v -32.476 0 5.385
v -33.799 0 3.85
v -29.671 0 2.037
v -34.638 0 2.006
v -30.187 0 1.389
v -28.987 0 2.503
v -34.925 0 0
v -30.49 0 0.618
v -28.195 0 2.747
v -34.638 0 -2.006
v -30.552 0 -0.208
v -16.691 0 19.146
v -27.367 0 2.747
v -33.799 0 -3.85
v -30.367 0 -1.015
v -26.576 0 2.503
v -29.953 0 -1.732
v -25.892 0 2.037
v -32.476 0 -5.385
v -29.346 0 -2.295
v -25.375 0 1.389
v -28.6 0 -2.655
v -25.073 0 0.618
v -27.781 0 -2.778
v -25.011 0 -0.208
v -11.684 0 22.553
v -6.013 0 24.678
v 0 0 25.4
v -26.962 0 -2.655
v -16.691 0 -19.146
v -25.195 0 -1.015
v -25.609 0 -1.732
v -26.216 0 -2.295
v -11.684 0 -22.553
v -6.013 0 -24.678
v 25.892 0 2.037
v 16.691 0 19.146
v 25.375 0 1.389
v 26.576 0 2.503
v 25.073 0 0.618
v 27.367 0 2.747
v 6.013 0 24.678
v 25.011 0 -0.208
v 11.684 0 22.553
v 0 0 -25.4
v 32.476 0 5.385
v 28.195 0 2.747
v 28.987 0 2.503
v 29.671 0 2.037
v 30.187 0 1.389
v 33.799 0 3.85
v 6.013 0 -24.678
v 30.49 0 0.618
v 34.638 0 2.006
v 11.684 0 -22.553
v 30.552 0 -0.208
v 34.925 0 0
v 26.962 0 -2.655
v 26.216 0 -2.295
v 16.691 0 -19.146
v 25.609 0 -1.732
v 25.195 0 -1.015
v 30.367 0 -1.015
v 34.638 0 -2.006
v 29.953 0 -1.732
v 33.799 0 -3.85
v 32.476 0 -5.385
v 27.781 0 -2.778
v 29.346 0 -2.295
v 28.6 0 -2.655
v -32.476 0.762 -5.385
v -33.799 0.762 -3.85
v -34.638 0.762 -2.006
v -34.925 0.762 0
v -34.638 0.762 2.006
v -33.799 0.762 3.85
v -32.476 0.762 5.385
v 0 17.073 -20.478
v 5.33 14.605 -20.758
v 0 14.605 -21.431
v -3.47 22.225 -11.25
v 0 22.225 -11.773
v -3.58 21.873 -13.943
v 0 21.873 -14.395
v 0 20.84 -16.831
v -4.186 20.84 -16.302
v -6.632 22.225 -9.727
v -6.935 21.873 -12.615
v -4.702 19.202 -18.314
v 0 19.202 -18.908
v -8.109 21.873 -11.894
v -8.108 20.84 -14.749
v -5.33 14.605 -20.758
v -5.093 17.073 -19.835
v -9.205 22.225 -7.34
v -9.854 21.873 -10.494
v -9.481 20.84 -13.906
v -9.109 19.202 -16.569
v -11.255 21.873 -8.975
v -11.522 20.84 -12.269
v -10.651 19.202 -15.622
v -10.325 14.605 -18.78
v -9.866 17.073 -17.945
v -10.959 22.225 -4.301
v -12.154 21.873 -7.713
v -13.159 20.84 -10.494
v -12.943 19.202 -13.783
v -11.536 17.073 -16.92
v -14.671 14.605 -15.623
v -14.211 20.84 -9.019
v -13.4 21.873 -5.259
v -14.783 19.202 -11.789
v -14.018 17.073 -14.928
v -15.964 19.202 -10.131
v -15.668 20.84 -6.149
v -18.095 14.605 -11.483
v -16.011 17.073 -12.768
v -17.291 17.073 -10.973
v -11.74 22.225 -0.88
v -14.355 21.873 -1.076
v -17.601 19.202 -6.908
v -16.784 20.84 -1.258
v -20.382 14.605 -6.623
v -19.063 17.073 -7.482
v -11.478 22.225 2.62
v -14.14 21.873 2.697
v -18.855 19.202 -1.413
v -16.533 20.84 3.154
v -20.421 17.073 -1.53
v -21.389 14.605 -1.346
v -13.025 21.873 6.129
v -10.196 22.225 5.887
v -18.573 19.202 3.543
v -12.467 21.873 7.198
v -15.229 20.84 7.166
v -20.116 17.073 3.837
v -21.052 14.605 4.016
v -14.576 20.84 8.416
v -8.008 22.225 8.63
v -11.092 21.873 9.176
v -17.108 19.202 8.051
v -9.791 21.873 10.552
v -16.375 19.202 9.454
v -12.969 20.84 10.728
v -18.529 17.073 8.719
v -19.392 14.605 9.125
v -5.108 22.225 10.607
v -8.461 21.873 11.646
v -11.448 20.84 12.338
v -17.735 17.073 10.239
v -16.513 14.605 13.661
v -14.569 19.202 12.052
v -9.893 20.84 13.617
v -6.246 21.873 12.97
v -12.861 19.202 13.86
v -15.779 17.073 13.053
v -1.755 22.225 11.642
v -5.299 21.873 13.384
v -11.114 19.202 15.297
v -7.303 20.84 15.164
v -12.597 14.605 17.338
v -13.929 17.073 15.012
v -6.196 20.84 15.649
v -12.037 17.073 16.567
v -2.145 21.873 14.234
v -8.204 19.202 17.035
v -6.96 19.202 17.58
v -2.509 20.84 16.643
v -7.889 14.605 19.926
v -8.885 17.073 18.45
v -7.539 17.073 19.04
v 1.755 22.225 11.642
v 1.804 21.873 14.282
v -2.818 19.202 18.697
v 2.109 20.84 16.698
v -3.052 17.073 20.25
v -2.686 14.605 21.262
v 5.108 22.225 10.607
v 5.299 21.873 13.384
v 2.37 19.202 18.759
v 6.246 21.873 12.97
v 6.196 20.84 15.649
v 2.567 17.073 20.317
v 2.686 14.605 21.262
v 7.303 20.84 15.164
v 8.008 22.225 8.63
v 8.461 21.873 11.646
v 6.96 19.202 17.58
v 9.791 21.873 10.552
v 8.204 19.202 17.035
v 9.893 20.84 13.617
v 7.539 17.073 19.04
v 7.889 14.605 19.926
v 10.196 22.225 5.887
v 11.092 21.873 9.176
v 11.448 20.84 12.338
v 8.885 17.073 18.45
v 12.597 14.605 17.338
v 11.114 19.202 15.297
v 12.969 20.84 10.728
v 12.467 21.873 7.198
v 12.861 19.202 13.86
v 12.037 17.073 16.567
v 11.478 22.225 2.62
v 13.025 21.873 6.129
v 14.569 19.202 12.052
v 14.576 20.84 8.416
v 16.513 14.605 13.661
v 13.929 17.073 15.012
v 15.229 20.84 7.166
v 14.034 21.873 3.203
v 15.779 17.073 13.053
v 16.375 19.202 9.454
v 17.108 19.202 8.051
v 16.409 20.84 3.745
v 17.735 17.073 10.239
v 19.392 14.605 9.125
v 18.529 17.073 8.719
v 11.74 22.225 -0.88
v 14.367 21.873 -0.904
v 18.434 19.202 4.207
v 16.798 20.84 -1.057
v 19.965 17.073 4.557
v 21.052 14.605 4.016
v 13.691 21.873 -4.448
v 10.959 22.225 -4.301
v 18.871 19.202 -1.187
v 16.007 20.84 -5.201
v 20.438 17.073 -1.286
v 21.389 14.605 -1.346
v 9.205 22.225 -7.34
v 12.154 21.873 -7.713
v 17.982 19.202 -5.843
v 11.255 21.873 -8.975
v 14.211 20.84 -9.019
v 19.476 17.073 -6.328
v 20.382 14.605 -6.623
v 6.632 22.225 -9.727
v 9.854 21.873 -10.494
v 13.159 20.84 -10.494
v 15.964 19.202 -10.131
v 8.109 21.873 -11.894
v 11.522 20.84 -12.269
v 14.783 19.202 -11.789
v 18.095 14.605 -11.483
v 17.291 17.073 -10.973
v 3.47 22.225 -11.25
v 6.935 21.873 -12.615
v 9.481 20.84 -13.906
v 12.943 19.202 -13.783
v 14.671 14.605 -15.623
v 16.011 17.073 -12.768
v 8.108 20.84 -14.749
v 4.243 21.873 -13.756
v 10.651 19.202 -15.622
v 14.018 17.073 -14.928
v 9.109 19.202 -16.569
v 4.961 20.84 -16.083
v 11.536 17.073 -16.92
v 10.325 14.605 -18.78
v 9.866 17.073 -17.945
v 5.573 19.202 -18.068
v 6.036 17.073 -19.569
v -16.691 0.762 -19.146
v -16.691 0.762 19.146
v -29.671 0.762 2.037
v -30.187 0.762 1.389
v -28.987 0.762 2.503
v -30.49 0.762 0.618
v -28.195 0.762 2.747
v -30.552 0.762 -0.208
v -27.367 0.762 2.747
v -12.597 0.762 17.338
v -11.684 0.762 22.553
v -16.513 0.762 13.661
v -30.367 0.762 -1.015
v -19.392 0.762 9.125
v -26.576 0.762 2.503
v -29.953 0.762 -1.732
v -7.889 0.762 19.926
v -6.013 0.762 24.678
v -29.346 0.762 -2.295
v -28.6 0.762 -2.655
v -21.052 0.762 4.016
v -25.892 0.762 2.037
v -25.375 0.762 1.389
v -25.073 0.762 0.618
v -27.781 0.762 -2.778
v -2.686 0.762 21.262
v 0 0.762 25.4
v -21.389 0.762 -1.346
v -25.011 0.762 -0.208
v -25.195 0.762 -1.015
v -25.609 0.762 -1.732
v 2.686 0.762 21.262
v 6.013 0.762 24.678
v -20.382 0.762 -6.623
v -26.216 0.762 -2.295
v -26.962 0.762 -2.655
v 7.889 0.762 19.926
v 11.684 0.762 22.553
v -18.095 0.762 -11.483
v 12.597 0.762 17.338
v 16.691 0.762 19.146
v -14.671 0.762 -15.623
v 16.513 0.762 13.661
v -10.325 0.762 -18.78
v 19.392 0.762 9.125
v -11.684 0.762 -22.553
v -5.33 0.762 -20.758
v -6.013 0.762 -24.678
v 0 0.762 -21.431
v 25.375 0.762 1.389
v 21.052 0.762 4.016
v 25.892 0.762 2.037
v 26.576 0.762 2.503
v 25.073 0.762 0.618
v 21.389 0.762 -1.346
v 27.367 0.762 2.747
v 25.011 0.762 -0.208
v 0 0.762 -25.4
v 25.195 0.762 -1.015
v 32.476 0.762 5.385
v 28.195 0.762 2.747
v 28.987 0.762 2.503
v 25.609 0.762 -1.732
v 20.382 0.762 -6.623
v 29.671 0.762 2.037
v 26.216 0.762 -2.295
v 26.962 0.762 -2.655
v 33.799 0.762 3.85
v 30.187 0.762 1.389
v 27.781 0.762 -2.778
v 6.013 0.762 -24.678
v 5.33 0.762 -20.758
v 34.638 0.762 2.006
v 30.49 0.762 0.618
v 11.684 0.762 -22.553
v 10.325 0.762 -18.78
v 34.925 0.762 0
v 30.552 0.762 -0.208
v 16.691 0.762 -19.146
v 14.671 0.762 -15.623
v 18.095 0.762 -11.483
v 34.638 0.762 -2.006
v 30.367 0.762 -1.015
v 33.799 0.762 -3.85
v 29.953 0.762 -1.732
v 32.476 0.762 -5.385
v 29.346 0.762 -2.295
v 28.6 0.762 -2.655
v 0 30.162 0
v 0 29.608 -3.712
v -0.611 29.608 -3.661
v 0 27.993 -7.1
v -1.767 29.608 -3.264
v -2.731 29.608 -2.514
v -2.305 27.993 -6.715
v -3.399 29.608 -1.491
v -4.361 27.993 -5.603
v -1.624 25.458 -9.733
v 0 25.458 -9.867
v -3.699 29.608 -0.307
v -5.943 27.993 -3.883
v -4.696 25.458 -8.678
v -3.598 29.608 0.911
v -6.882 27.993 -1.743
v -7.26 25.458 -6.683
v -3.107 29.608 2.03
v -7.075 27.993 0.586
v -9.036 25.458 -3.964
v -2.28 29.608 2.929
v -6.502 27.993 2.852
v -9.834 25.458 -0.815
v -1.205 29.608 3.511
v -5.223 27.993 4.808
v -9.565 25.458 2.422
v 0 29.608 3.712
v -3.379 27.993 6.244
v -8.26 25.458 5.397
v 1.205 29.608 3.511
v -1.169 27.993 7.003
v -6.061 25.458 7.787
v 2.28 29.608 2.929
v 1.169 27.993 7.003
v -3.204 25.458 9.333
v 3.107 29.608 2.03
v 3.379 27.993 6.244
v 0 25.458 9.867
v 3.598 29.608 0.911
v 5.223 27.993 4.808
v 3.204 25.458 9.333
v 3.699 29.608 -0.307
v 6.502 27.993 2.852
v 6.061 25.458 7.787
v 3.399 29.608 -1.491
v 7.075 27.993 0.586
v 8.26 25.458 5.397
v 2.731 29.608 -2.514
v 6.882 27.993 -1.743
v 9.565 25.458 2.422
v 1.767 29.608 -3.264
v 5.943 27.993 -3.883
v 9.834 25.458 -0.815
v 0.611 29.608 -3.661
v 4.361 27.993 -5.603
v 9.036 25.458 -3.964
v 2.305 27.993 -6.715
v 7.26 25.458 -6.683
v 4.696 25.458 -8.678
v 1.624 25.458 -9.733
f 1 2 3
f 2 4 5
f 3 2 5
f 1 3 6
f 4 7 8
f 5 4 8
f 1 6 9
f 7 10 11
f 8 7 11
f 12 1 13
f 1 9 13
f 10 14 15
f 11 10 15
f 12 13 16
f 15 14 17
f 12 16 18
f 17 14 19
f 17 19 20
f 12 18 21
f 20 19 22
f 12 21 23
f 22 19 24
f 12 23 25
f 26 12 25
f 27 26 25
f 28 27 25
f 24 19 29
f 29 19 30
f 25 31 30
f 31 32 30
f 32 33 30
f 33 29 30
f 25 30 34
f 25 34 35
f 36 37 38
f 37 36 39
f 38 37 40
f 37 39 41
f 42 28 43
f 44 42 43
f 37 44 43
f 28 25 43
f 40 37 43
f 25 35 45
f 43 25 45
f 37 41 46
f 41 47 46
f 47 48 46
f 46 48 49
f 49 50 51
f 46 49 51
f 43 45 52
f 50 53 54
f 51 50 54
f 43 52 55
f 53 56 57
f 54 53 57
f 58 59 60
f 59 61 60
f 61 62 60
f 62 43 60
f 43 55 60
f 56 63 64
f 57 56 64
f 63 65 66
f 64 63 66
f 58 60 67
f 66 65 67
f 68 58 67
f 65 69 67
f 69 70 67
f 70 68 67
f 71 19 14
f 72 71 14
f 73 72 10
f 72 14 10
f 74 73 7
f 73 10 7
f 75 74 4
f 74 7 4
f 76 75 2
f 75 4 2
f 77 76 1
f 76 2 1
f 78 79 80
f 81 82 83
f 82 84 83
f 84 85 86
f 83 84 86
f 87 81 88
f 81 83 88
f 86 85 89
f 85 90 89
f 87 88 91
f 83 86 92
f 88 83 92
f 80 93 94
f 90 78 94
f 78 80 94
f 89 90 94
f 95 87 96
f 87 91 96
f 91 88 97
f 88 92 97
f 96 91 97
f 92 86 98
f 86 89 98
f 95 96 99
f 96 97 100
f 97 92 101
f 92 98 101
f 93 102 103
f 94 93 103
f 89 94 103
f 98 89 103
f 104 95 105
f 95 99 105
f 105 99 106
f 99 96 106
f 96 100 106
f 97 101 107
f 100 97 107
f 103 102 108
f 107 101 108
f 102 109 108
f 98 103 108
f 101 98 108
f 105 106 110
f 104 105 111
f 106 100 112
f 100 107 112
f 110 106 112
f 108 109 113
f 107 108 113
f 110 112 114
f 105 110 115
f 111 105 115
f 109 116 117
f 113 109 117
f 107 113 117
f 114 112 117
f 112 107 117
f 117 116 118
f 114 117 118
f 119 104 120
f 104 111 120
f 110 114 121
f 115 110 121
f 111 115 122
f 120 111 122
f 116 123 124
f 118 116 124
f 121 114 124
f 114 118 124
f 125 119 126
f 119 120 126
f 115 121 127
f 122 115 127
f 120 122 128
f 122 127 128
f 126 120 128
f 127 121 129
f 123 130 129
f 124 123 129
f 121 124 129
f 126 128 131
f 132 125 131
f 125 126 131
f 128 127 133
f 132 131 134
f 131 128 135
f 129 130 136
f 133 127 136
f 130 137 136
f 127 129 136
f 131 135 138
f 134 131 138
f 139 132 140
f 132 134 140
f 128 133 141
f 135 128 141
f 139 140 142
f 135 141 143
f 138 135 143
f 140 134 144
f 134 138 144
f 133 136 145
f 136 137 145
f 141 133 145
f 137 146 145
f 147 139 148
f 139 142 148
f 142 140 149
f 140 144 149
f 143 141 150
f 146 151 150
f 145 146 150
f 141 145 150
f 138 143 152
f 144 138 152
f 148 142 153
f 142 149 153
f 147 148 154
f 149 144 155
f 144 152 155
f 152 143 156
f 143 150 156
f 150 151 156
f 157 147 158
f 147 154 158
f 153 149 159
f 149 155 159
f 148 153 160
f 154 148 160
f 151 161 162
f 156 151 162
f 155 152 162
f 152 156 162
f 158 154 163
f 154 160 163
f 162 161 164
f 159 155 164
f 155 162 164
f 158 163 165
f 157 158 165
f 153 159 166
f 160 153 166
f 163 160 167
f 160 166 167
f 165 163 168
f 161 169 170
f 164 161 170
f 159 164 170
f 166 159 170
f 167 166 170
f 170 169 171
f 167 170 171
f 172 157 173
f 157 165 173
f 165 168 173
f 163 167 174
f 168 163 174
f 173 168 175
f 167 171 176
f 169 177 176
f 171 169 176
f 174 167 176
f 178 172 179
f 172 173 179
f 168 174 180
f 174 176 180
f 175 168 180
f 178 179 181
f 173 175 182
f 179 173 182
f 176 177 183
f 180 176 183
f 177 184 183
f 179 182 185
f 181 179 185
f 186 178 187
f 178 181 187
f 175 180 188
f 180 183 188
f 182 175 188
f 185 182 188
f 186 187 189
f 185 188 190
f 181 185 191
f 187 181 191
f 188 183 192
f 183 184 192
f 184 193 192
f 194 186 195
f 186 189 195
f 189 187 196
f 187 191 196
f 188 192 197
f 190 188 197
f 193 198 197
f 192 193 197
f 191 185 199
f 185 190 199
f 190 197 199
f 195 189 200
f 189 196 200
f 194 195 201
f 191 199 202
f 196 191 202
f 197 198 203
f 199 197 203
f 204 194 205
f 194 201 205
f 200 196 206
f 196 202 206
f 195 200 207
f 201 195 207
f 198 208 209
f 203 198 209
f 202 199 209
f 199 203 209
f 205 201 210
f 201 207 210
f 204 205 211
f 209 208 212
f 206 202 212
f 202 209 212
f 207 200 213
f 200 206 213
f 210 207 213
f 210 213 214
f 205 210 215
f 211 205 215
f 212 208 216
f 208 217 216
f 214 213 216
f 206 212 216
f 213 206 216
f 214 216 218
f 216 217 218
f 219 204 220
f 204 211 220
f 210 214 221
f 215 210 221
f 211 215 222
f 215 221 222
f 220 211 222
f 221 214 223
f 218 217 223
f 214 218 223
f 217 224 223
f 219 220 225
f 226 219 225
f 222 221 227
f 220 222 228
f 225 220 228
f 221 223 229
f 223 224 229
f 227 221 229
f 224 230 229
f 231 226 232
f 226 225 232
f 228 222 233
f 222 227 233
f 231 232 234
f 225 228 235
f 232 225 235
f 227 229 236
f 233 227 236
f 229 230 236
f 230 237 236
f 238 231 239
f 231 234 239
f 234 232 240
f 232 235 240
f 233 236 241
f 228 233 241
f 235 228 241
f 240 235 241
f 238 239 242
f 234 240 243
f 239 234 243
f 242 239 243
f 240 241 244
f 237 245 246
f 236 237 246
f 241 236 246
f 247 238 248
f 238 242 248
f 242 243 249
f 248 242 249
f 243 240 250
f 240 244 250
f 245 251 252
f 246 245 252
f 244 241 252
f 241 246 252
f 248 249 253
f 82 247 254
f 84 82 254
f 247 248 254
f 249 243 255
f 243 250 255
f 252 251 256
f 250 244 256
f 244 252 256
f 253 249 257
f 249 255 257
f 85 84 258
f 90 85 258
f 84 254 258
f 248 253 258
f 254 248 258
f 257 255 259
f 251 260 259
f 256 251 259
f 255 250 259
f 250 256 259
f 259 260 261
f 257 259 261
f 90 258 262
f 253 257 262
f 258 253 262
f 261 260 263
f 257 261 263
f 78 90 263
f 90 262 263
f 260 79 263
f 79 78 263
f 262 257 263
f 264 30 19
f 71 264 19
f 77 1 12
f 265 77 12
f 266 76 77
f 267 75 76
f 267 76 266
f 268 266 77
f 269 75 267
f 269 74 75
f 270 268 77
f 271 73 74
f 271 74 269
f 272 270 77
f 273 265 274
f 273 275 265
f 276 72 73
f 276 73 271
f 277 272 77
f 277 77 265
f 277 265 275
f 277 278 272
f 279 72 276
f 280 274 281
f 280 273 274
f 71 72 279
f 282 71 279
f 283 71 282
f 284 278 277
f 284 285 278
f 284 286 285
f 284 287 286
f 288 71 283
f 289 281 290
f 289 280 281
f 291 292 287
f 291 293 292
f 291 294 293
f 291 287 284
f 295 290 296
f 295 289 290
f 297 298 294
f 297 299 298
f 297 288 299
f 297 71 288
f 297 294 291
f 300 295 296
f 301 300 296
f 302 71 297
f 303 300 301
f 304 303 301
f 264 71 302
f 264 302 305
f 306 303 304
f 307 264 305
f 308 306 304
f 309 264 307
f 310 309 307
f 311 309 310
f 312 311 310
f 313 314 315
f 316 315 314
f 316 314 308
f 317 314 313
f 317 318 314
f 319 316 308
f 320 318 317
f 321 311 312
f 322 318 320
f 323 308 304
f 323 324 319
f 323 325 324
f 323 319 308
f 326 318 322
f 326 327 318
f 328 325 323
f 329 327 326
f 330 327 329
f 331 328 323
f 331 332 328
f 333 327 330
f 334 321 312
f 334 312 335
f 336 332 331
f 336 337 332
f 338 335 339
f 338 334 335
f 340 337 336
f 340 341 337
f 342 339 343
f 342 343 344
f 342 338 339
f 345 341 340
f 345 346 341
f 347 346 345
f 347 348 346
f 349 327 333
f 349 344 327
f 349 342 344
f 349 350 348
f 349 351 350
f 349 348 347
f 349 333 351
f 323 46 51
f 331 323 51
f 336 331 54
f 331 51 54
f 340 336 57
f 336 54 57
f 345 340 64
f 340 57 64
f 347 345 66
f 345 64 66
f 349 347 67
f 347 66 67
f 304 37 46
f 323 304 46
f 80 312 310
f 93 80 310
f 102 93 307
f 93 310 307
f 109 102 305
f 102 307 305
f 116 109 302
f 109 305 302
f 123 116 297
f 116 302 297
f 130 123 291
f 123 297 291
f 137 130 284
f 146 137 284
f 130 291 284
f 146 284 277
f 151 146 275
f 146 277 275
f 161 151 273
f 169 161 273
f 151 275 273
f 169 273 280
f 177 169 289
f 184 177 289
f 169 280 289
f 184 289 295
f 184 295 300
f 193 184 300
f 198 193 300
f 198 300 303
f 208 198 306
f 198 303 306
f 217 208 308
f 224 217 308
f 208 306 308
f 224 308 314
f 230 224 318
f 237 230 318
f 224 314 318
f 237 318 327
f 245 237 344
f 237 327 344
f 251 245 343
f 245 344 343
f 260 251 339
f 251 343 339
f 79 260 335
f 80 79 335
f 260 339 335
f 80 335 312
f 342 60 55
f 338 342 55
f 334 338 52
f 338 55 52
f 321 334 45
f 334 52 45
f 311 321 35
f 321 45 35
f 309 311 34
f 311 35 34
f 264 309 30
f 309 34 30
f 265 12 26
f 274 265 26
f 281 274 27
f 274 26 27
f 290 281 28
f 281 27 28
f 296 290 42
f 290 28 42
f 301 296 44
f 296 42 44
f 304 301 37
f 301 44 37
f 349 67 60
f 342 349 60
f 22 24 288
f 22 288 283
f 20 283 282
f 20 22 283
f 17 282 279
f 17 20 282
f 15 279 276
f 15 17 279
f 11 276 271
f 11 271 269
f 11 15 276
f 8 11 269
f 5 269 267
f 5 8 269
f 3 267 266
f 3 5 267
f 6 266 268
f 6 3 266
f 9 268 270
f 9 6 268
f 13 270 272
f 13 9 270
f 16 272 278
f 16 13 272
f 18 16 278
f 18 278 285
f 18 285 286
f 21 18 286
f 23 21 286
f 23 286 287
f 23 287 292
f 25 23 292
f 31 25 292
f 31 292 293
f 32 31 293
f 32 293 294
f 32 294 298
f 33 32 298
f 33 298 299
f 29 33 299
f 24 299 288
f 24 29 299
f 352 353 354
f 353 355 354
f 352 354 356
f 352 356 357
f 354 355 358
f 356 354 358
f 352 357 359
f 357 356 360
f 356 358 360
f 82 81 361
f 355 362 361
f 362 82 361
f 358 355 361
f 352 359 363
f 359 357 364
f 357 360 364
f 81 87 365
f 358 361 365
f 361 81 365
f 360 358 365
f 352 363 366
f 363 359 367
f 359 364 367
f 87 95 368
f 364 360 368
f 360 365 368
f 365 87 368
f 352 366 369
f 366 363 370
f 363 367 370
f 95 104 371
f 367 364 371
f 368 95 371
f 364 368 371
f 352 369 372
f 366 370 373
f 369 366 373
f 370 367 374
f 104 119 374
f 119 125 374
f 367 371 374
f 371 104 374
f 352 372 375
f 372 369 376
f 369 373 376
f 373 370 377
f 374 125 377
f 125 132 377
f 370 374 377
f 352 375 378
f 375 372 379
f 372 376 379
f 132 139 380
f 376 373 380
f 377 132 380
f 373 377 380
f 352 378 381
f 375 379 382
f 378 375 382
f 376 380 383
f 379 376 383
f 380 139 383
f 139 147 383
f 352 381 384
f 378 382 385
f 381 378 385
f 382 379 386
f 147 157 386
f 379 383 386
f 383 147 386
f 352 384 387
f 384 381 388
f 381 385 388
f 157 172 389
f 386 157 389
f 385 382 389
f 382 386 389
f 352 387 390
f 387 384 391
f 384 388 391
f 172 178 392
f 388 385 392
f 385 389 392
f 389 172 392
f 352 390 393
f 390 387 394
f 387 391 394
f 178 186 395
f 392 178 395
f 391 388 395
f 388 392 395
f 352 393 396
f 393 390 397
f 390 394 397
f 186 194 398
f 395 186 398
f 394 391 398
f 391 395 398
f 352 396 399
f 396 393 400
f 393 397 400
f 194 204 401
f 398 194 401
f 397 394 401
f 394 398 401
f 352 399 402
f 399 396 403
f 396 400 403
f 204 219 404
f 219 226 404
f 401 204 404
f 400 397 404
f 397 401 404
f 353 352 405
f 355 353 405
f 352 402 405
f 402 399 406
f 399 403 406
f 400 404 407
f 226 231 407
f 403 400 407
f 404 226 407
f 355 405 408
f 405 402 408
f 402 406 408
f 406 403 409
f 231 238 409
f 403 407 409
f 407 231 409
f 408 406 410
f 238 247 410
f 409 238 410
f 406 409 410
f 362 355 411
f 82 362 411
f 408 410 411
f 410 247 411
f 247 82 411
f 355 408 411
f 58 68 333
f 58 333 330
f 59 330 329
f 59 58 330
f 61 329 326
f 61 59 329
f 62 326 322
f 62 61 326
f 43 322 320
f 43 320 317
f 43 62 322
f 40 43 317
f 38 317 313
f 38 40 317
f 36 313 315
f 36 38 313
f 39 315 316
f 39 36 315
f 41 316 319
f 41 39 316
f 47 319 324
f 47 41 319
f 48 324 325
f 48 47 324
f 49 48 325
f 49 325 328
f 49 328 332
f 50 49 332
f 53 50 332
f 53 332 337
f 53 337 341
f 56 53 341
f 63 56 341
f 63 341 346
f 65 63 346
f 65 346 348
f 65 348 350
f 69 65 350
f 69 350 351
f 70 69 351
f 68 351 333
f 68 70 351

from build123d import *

# Parameters (mm, degrees)
SKETCH1_R           = 2.778125
BOSS_EXTRUDE1_DEPTH = 0.762


with BuildPart() as part:
    # Sketch1 → Boss-Extrude1 (new body)
    with BuildSketch(Plane(origin=(0, 0, 0), x_dir=(1, 0, 0), z_dir=(0, 1, 0))):
        with BuildLine():
            Line((-16.691428571, 19.145657791), (-32.475714286, 5.384716254))
            ThreePointArc((-32.475714286, 5.384716254), (-34.925, 0), (-32.475714286, -5.384716254))
            Line((-32.475714286, -5.384716254), (-16.691428571, -19.145657791))
            ThreePointArc((-16.691428571, -19.145657791), (0, -25.4), (16.691428571, -19.145657791))
            Line((16.691428571, -19.145657791), (32.475714286, -5.384716254))
            ThreePointArc((32.475714286, -5.384716254), (34.925, 0), (32.475714286, 5.384716254))
            Line((32.475714286, 5.384716254), (16.691428571, 19.145657791))
            ThreePointArc((16.691428571, 19.145657791), (0, 25.4), (-16.691428571, 19.145657791))
        make_face()
        with Locations(Location((-27.78125, 0, 0), (0, 0, 90))):
            Circle(SKETCH1_R, mode=Mode.SUBTRACT)
        with Locations(Location((27.78125, 0, 0), (0, 0, 90))):
            Circle(SKETCH1_R, mode=Mode.SUBTRACT)
    extrude(amount=BOSS_EXTRUDE1_DEPTH)

    # Sketch2 → Revolve1 (revolve)
    with BuildSketch(Plane.XY, mode=Mode.PRIVATE) as revolve1_sk:
        with BuildLine():
            Line((21.43125, 14.605), (21.43125, 0))
            Line((21.43125, 0), (0, 0))
            Line((0, 0), (0, 30.1625))
            ThreePointArc((0, 30.1625), (7.099515829, 27.992783709), (11.773215098, 22.225))
            ThreePointArc((11.773215098, 22.225), (17.924272694, 20.090631215), (21.43125, 14.605))
        make_face()
    revolve(revolve1_sk.sketch.rotate(Axis((0, 0, 0), (0, 1, 0)), 90), axis=Axis((0, 0, 0), (0, 1, 0)))


solid = part.part
